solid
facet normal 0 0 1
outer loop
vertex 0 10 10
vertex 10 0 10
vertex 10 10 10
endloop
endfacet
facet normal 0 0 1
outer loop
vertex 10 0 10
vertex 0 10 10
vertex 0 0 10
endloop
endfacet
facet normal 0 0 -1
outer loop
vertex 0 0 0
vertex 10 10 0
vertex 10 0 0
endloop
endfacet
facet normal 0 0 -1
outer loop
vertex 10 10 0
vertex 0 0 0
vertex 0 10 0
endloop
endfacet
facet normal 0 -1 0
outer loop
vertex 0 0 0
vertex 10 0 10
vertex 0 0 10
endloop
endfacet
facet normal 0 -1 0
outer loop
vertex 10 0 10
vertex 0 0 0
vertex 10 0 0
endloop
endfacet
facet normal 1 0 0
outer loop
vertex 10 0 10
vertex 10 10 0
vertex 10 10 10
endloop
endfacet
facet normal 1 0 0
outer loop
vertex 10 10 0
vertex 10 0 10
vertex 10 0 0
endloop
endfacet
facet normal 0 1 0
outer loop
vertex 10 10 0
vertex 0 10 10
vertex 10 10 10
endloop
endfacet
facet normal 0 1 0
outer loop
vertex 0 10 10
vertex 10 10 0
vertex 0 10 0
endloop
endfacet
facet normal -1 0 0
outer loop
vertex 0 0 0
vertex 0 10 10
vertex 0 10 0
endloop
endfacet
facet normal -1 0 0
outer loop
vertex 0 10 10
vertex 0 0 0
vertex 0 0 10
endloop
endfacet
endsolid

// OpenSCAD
// * Discription what the *.scad is about ect.

// ==================================
// = Used Libraries =
// ==================================


// ==================================
// = Variables =
// ==================================

// sizing printing or print a small part to test the object.
DesignStatus="sizing"; // ["sizing","fitting","printing"]
// Variables seen by customizer

TestSlab_X=50;
TestSlab_Y=100;
TestSlab_Z=30;

TestCylinder_H=35;
TestCylinder_D1=25;
TestCylinder_D2=45;

TestSphere_D=42;

!cube(10);

module __Customizer_Limit__ () {}  // before these, the variables are usable in the cutomizer
shown_by_customizer = false;


Invisible=42;
TestslabTransl_X=25;
TestslabRotate_X=30;

// === Facettes Numbers ===

FN_HexNut=6;
FN_Performance=36;
FN_FooBaa=12;
// Divisebile by 4 to align Cylinders whithout small intersections taht cause problems due to smal holes in surfaches and self intersections on round objects

FN_Rough=12;
FN_MediumRough=16;
FN_Medium=36;
FN_Fine=72;
FN_ExtraFine=144;

// Funktionalety to provide a global switch to set the $fn parameter to lower values to run faster when in development and to set it to heigh and fancy when getting serius about exporting a rocket schaped object to hide in dark spots. 


// ==================================
// = Tuning Variables =
// ==================================
// Variables for finetuning (The Slegehammer if something has to be made fit)

// ==================================
// = Test Stage =
// ==================================

// BLUEPRINT_Enviroment
module MirrorMirrorOnTheWall(Offset_X,Offset_Y){
    translate([-Offset_X,Offset_Y,0]){
        children();
        mirror([0,1,0]){
            children();
        }
    }
    translate([Offset_X,-Offset_Y,0]){
        mirror([1,0,0]){
            children();
            mirror([1,0,0]){
                children();
            }
        }
    }
}
// BLUEPRINT_Enviroment
if (DesignStatus=="printing"){
$fn = $preview ? 12 : 72; // Facets in preview (F5) set to 12, in Reder (F6) is set to 72
    intersection(){
        //TEST_OBJECT(FN_ExtraFine);
        //cube([1000,1000,1000],center=true);
    }
    translate([0,0,0]){
        TEST_OBJECT();
    }
    translate([0,0,0]){
        difference(){
            TEST_SPHERE();
            TEST_CUTCYLINDER();
        }
    }
}
// BLUEPRINT_Enviroment
if(DesignStatus=="fitting"){
    intersection(){
        //TEST_OBJECT(FN_ExtraFine);
        translate([0,0,1]){
            cube([1000,1000,1],center=true);
        }
        union(){
            translate([0,0,0]){
                TEST_OBJECT();
            }
            translate([0,0,0]){
                difference(){
                    TEST_SPHERE();
                    TEST_CUTCYLINDER();
                }
            }
        }//TEST_OBJECT(FN_FACETTES=FN_MediumRough);
    }
}


// Iterates and coloures the parts distingushable
if (DesignStatus=="sizing"){
// $fn = $preview ? 12 : 72; // Facets in preview (F5) set to 12, in Reder (F6) is set to 72
    see_me_in_colourful(){
        translate([0,0,0]){
            TEST_OBJECT();
        }
        translate([0,0,0]){
        }        
        translate([0,0,0]){
            TEST_SPHERE();
        }
        translate([0,0,0]){
        }
        translate([0,0,0]){
            TEST_CUTCYLINDER();
        }
        union(){
        }
        translate([ 0,0,0]){
        }
    }
}
// Module to help coloring different modules to make  ist easier
// 
module ALL_THE_little_THINGS(PARAMETERS){

    see_me_in_colourful(){
        translate([0,0,0]){
            TEST_OBJECT();
        }
        translate([0,0,0]){
        
        }        
        translate([0,0,0]){
            TEST_SPHERE();
        }
        translate([0,0,0]){
        }
        translate([0,0,0]){
            TEST_CUTCYLINDER();
        }
        union(){
            
        }
        translate([ 0,0,0]){
        }
    }
}
module see_me_in_colourful(){
    //difference(){
        //union(){
          translate([0,0,0]){
            for(i=[0:1:$children-1]){
                a=255;
                b=50;
                k_farbabstand=((a-b)/$children);
                Farbe=((k_farbabstand*i)/255);
                SINUS_Foo=0.5+(sin(((360/(a-b))*k_farbabstand)*(i+1)))/2;
                COSIN_Foo=0.5+(cos(((360/(a-b))*k_farbabstand)*(i+1)))/2;
                color(c = [ SINUS_Foo,
                            1-(SINUS_Foo/2+COSIN_Foo/2),
                            COSIN_Foo],
                            alpha = 0.5){  
                    //MirrorMirrorOnTheWall(0){
                    difference(){
                        //MirrorMirrorOnTheWall(0){
                            render(convexity=20){children(i);}
                            //children(i);
                            translate([70/2,0,0]){
                                    //cube([80,70,150],center=true);
                                }
                        //}
// Creates a Cutting to see a Sidesection cut of the objects
                            color(c = [ SINUS_Foo,
                                1-(SINUS_Foo/2+COSIN_Foo/2),
                                COSIN_Foo],
                                alpha = 0.0){
                                translate([70/2,0,0]){
                                    //cube([10,20,150],center=true);
                                }
                                translate([-50,-50,0]){
                                    //cube([100,50,200],center=false);
                                    }
                                }
                            }
                        }
                    }
                }
            }
// == Testprints ==

Projection_Cutter(5){
//see_me_half();
}

//// == Cutes a slice of the Objekts
Intersection_Test_Cut("xy",1.5,16){
 //Intersection_Test_Cut( "xy",           // "Plaine xy yz xz", 
                       // 1,              // Slicethickness , 
                        //5,              // Distance from coordinate origin in plaine )
   // OBJECTMODULESHERE 
   //Frame_Base();
}

// ==================================
// = Modus =
// ==================================

 
// ==================================
// = Stage =
// ==================================
// Final module for Produktion

module Assembly(){

}
module TEST_OBJECT(){
    difference(){
        TEST_CUTCUBE(TestSlab_X,TestSlab_Y,TestSlab_Z);
        TEST_CUTCYLINDER();
    }
    TEST_SPHERE();
}

// ===============================================================================
// =--------------------------------- Enviroment Modules ------------------------=
// ===============================================================================
// Modules that resembles the Enviroment aka the helmet where to atach a camera mount


// ===============================================================================
// =--------------------------------- Modules -----------------------------------=
// ===============================================================================
//TEST_OBJECT();

module TEST_CUTCUBE(X=30,Y=60,Z=15){
    cube([X,Y,Z]);
}
module TEST_SPHERE(D=TestSphere_D){
//$fn = $preview ? 12 : 72; // Facets in preview (F5) set to 12, in Reder (F6) is set to 72
    difference(){
        sphere(d=D);
        TEST_CUTCYLINDER();
    }
}
module TEST_CUTCYLINDER(H=TestCylinder_H,D1=TestCylinder_D1,D2=TestCylinder_D2){
    cylinder(h=H,d1=D1,d2=D2,$fn=24);
}

// ===============================================================================
// ---------------------------------- Cutting Modules ----------------------------
// ===============================================================================
// === Half Cutter

//HEX_Mesh_Pattern(){ Mesh(2.5,2.5);}
module HEX_Mesh_Pattern(X=10,Y=30,DELTA=5,GRPL_X=45,GRPL_Y=115){
Count_X=X;
Count_Y=Y;

//DELTA=1;

X_STEPP=5.5+DELTA;
Y_STEPP=7.5+DELTA;

k=DELTA; //Distance between Hexshapes may be HEX_D/4 is good
HEX_D=(GrindingPlate_X-((Count_X-1)*k/2))/(Count_X-1);

SCALE_Y=GrindingPlate_Y/((HEX_D/2+k/4)*sqrt(3)*(Count_Y-1));
echo("HEX_D*Count_Y",HEX_D*(Count_Y));
echo("GrindingPlate_Y",GrindingPlate_Y);
echo("SCALE_Y",SCALE_Y);

//square([15,(HEX_D/2+k/4)*sqrt(3)*(Count_Y-1)]); // Helper Foo
    
// +++++++++++++++++++++++++++++++++++++++++
    scale([1,SCALE_Y,1]){
        union(){
            for(j=[0:1:Count_Y-1]){
                for(i=[0:1:Count_X-1-j%2]){
                    translate([i*(HEX_D+k/2),0,0]){
                        translate([(HEX_D/2+k/4)*(j%2),
                                    j*((HEX_D/2+k/4)*sqrt(3)),
                                    0]                          ){
                        //translate([0,j*Y_STEPP,0]){
                        rotate([0,0,60]){
                            circle(d=HEX_D,$fn=6);
                        }
                            //children();
                        }
                    }
                }
            }
        }
    }
}
//Mesh(5,2);
module Mesh(SHAPEDIMENSION_X=2.5,RADIUS=0.0){
minkowski(){
    circle(SHAPEDIMENSION_X-RADIUS,$fn=6);
    //circle(r=RADIUS,$fn=64);
    }
    //circle(SHAPEDIMENSION_X,$fn=6); // Size Testing
}
//Screwcutter(100,10,100,4,1,5);
module Screwcutter( SCREW_HEAD_h=200,
                    SCREW_HEAD_d=40,
                    SCREW_BOLT_h=200,
                    SCREW_BOLT_d=3,
                    SCREW_CAMPFER_h,
                    SCREW_CAMPFER_d=SCREW_BOLT_d    ){
    translate([0,0,-SCREW_HEAD_h]){
        cylinder(h=SCREW_HEAD_h,d=SCREW_HEAD_d,$fn=32);
    }
    translate([0,0,0]){
        cylinder(h=SCREW_CAMPFER_h,d2=SCREW_BOLT_d,d1=SCREW_CAMPFER_d,$fn=32);    
    }
    translate([0,0,0]){
        cylinder(h=SCREW_BOLT_h,d=SCREW_BOLT_d,$fn=32);
    }
}
//Bolt(25,3,8,3);
module Bolt(BOLTLENGTH,BOLTDIAMETER,HEADDIAMETER,HEADHEIGHT){
    cylinder(h=BOLTLENGTH,d=BOLTDIAMETER,center=false,$fn=FN_Performance);
    translate([0,0,-HEADHEIGHT/2]){
        cylinder(h=HEADHEIGHT,d=HEADDIAMETER,center=true,$fn=6);
        cylinder(h=HEADHEIGHT,d=HEADDIAMETER,center=true,$fn=6);
    }
}
//Projection_Cutter(3){sphere(10);};
module Projection_Cutter(Offset_z){    
    projection(cut = true){
        translate([0,0,Offset_z]){
            children();
        }
    }
}
// ===============================================================================
// ---------------------------------- Intersection Modules -----------------------
// ===============================================================================

module Intersection_Test_Cut(PLAIN,THICKNESS,OFFSET){
// ==== EXAMPLE ====
//    !Intersection_Test_Cut("xy",1,7/2){sphere(7);};
// ==== EXAMPLE ====
    if (PLAIN=="xz"){
        intersection(){
            children();
            translate([0,OFFSET,0]){
                cube([100,THICKNESS,100],center=true);
            }
        }
    }
    else if (PLAIN=="xy") {
        intersection(){
            children();
            translate([0,0,OFFSET]){
                cube([500,500,THICKNESS],center=true);
            }
        }
    }
    else if (PLAIN=="yz") {
        intersection(){
            children();
            translate([OFFSET,0,0]){
                cube([THICKNESS,100,100],center=true);
            }
        }   
    }
}
// ===============================================================================
// ---------------------------------- Linear Extrude Modules ---------------------
// ===============================================================================

//Ring_Shaper(3,15,1.5);
module Ring_Shaper(HEIGHT,OUTER,WALLTHICKNESS){
    linear_extrude(HEIGHT){
        2D_Ring_Shape(OUTER,WALLTHICKNESS);
    }
}
//Linear_Extruding(10,-1){2D_Rounded_Square_Base_Shape(10,20,3);}
module Linear_Extruding(ExtrudeLength,ExrtudingDirektionInverter){
//   0  Normal
//  -1  inverted
//   1  
    Length=ExtrudeLength;
    translate([0,0,Length*ExrtudingDirektionInverter]){
        linear_extrude(height=ExtrudeLength){
            children();
        }
    }
}

// ===============================================================================
// ---------------------------------- Rotate Extrude Modules ---------------------
// ===============================================================================

//DONUT(1,20,1,7);
module DONUT(DIAMETER,DIAMETER_RING,SCAL_X,SCAL_Y){
//DIAMETER The dough part
//DIAMETER_RING The hole part
//SCAL_X, skales the x dimension
//SCAL_Y, skales the y dimension
    rotate_extrude(angle=360,convexity=3,$fn=FN_Fine){
        translate([DIAMETER_RING,0,0]){
            scale([SCAL_X,SCAL_Y,1]){
                circle(d=DIAMETER,$fn=FN_Fine);
            }
        }
    }
}
// ===============================================================================
// =--------------------------------- 2D-Shapes ---------------------------------=
// ===============================================================================

//2D_Ring_Shape(20,1);
module 2D_Ring_Shape(OUTER_D,WALLTHICKNESS){
    difference(){
        circle(d=OUTER_D,$fn=FN_Fine);
        circle(d=OUTER_D-2*WALLTHICKNESS,$fn=FN_Fine);
    }
}
//2D_Rounded_Square_Base_Shape(10,20,3);
module 2D_Rounded_Square_Base_Shape(DIMENSION_X=10,DIMENSION_Y=20,RADIUS=2,CENTER=true){
    if(CENTER){
        translate([0,0,0]){
            minkowski(){
                square([DIMENSION_X-RADIUS*2,DIMENSION_Y-RADIUS*2],center=CENTER);
                circle(r=RADIUS,$fn=FN_Fine);
            }
        }
    }
    else{
        translate([RADIUS,RADIUS,0]){
            minkowski(){
                square([DIMENSION_X-RADIUS*2,DIMENSION_Y-RADIUS*2],center=CENTER);
                circle(r=RADIUS,$fn=FN_Fine);
            }
        }
    }
}
// ===============================================================================
// =--------------------------------- Symetrie Helper ---------------------------=
// ===============================================================================
//XY_Symetrie(10,25){cube(10);}
module XY_Symetrie(X=10,Y=25){
   translate([X,Y,0]){
       children();
       }
    mirror([1,0,0]){
        translate([X,Y,0]){
            children();
       }
    }
    mirror([0,1,0]){
        translate([X,Y,0]){
            children();
        }
        mirror([1,0,0]){
            translate([X,Y,0]){
                children();
            }
        }
    }
}
// ===============================================================================
// =--------------------------------- Textembossing -----------------------------=
// ===============================================================================


// ===============================================================================
// =--------------------------------- Smoothing ---------------------------------=
// ===============================================================================

2D_Smooth_r=1;
// Radius of a outer Tip Rounding 
2D_Fillet_r=1;
// Radius of a inner corner Ronding
2D_Chamfer_DELTA_INN=1;
2D_Chamfer_DELTA_OUT=2;

// a straigt line on edges and corners
2D_Chamfer_BOOLEAN=false;

    
module Smooth(r=3){
    //$fn=30;
    offset(r=r,$fn=30){
        offset(r=-r,$fn=30){
        children();
        }
    }
}
module Fillet(r=3){
    //$fn=30;
    offset(r=-r,$fn=30){
        offset(r=r,$fn=30){
            children();
        }
    }
}
module Chamfer_OUTWARD(DELTA_OUT=3){
    //$fn=30;
    offset(delta=DELTA_OUT,chamfer=true,$fn=30){
        offset(delta=-DELTA_OUT,chamfer=true, $fn=30){
            children();
        }
    }
}
module Chamfer_INWARD(DELTA_INN=3){
    //$fn=30;
    offset(delta=-DELTA_INN,chamfer=true,$fn=30){
        offset(delta=DELTA_INN,chamfer=true, $fn=30){
            children();
        }
    }
}

// ===============================================================================
// =--------------------------------- Ruthex --------------------------------=
// ===============================================================================
// Dimensions for Ruthex Tread inseerts

//RUTHEX_M3();
module RUTHEX_M3(){    
L=5.7+5.7*0.25; // Length + Margin
echo("RUTHEX",L);
D1=4.0;    
    translate([0,0,0]){
        rotate([0,0,0]){
            translate([0,0,0]){
                cylinder(h=L,d1=D1,d2=D1,$fn=FN_Performance);
            }
        }
    }
}

// ===============================================================================
// =--------------------------------- Import STL --------------------------------=
// ===============================================================================

module NAME_OF_IMPORT(){
    rotate([0,0,-90]){
        translate([-515,-100,-45]){
            import("PATH/TO/FILE.stl",convexity=3);
        }
    }
}

// ===============================================================================
// =--------------------------------- Import PNG --------------------------------=
// ===============================================================================

module NAME_OF_IMPORT(){
    rotate([0,0,-90]){
        translate([-515,-100,-45]){
            import("PATH/TO/FILE.PNG",convexity=3);
        }
    }
}
